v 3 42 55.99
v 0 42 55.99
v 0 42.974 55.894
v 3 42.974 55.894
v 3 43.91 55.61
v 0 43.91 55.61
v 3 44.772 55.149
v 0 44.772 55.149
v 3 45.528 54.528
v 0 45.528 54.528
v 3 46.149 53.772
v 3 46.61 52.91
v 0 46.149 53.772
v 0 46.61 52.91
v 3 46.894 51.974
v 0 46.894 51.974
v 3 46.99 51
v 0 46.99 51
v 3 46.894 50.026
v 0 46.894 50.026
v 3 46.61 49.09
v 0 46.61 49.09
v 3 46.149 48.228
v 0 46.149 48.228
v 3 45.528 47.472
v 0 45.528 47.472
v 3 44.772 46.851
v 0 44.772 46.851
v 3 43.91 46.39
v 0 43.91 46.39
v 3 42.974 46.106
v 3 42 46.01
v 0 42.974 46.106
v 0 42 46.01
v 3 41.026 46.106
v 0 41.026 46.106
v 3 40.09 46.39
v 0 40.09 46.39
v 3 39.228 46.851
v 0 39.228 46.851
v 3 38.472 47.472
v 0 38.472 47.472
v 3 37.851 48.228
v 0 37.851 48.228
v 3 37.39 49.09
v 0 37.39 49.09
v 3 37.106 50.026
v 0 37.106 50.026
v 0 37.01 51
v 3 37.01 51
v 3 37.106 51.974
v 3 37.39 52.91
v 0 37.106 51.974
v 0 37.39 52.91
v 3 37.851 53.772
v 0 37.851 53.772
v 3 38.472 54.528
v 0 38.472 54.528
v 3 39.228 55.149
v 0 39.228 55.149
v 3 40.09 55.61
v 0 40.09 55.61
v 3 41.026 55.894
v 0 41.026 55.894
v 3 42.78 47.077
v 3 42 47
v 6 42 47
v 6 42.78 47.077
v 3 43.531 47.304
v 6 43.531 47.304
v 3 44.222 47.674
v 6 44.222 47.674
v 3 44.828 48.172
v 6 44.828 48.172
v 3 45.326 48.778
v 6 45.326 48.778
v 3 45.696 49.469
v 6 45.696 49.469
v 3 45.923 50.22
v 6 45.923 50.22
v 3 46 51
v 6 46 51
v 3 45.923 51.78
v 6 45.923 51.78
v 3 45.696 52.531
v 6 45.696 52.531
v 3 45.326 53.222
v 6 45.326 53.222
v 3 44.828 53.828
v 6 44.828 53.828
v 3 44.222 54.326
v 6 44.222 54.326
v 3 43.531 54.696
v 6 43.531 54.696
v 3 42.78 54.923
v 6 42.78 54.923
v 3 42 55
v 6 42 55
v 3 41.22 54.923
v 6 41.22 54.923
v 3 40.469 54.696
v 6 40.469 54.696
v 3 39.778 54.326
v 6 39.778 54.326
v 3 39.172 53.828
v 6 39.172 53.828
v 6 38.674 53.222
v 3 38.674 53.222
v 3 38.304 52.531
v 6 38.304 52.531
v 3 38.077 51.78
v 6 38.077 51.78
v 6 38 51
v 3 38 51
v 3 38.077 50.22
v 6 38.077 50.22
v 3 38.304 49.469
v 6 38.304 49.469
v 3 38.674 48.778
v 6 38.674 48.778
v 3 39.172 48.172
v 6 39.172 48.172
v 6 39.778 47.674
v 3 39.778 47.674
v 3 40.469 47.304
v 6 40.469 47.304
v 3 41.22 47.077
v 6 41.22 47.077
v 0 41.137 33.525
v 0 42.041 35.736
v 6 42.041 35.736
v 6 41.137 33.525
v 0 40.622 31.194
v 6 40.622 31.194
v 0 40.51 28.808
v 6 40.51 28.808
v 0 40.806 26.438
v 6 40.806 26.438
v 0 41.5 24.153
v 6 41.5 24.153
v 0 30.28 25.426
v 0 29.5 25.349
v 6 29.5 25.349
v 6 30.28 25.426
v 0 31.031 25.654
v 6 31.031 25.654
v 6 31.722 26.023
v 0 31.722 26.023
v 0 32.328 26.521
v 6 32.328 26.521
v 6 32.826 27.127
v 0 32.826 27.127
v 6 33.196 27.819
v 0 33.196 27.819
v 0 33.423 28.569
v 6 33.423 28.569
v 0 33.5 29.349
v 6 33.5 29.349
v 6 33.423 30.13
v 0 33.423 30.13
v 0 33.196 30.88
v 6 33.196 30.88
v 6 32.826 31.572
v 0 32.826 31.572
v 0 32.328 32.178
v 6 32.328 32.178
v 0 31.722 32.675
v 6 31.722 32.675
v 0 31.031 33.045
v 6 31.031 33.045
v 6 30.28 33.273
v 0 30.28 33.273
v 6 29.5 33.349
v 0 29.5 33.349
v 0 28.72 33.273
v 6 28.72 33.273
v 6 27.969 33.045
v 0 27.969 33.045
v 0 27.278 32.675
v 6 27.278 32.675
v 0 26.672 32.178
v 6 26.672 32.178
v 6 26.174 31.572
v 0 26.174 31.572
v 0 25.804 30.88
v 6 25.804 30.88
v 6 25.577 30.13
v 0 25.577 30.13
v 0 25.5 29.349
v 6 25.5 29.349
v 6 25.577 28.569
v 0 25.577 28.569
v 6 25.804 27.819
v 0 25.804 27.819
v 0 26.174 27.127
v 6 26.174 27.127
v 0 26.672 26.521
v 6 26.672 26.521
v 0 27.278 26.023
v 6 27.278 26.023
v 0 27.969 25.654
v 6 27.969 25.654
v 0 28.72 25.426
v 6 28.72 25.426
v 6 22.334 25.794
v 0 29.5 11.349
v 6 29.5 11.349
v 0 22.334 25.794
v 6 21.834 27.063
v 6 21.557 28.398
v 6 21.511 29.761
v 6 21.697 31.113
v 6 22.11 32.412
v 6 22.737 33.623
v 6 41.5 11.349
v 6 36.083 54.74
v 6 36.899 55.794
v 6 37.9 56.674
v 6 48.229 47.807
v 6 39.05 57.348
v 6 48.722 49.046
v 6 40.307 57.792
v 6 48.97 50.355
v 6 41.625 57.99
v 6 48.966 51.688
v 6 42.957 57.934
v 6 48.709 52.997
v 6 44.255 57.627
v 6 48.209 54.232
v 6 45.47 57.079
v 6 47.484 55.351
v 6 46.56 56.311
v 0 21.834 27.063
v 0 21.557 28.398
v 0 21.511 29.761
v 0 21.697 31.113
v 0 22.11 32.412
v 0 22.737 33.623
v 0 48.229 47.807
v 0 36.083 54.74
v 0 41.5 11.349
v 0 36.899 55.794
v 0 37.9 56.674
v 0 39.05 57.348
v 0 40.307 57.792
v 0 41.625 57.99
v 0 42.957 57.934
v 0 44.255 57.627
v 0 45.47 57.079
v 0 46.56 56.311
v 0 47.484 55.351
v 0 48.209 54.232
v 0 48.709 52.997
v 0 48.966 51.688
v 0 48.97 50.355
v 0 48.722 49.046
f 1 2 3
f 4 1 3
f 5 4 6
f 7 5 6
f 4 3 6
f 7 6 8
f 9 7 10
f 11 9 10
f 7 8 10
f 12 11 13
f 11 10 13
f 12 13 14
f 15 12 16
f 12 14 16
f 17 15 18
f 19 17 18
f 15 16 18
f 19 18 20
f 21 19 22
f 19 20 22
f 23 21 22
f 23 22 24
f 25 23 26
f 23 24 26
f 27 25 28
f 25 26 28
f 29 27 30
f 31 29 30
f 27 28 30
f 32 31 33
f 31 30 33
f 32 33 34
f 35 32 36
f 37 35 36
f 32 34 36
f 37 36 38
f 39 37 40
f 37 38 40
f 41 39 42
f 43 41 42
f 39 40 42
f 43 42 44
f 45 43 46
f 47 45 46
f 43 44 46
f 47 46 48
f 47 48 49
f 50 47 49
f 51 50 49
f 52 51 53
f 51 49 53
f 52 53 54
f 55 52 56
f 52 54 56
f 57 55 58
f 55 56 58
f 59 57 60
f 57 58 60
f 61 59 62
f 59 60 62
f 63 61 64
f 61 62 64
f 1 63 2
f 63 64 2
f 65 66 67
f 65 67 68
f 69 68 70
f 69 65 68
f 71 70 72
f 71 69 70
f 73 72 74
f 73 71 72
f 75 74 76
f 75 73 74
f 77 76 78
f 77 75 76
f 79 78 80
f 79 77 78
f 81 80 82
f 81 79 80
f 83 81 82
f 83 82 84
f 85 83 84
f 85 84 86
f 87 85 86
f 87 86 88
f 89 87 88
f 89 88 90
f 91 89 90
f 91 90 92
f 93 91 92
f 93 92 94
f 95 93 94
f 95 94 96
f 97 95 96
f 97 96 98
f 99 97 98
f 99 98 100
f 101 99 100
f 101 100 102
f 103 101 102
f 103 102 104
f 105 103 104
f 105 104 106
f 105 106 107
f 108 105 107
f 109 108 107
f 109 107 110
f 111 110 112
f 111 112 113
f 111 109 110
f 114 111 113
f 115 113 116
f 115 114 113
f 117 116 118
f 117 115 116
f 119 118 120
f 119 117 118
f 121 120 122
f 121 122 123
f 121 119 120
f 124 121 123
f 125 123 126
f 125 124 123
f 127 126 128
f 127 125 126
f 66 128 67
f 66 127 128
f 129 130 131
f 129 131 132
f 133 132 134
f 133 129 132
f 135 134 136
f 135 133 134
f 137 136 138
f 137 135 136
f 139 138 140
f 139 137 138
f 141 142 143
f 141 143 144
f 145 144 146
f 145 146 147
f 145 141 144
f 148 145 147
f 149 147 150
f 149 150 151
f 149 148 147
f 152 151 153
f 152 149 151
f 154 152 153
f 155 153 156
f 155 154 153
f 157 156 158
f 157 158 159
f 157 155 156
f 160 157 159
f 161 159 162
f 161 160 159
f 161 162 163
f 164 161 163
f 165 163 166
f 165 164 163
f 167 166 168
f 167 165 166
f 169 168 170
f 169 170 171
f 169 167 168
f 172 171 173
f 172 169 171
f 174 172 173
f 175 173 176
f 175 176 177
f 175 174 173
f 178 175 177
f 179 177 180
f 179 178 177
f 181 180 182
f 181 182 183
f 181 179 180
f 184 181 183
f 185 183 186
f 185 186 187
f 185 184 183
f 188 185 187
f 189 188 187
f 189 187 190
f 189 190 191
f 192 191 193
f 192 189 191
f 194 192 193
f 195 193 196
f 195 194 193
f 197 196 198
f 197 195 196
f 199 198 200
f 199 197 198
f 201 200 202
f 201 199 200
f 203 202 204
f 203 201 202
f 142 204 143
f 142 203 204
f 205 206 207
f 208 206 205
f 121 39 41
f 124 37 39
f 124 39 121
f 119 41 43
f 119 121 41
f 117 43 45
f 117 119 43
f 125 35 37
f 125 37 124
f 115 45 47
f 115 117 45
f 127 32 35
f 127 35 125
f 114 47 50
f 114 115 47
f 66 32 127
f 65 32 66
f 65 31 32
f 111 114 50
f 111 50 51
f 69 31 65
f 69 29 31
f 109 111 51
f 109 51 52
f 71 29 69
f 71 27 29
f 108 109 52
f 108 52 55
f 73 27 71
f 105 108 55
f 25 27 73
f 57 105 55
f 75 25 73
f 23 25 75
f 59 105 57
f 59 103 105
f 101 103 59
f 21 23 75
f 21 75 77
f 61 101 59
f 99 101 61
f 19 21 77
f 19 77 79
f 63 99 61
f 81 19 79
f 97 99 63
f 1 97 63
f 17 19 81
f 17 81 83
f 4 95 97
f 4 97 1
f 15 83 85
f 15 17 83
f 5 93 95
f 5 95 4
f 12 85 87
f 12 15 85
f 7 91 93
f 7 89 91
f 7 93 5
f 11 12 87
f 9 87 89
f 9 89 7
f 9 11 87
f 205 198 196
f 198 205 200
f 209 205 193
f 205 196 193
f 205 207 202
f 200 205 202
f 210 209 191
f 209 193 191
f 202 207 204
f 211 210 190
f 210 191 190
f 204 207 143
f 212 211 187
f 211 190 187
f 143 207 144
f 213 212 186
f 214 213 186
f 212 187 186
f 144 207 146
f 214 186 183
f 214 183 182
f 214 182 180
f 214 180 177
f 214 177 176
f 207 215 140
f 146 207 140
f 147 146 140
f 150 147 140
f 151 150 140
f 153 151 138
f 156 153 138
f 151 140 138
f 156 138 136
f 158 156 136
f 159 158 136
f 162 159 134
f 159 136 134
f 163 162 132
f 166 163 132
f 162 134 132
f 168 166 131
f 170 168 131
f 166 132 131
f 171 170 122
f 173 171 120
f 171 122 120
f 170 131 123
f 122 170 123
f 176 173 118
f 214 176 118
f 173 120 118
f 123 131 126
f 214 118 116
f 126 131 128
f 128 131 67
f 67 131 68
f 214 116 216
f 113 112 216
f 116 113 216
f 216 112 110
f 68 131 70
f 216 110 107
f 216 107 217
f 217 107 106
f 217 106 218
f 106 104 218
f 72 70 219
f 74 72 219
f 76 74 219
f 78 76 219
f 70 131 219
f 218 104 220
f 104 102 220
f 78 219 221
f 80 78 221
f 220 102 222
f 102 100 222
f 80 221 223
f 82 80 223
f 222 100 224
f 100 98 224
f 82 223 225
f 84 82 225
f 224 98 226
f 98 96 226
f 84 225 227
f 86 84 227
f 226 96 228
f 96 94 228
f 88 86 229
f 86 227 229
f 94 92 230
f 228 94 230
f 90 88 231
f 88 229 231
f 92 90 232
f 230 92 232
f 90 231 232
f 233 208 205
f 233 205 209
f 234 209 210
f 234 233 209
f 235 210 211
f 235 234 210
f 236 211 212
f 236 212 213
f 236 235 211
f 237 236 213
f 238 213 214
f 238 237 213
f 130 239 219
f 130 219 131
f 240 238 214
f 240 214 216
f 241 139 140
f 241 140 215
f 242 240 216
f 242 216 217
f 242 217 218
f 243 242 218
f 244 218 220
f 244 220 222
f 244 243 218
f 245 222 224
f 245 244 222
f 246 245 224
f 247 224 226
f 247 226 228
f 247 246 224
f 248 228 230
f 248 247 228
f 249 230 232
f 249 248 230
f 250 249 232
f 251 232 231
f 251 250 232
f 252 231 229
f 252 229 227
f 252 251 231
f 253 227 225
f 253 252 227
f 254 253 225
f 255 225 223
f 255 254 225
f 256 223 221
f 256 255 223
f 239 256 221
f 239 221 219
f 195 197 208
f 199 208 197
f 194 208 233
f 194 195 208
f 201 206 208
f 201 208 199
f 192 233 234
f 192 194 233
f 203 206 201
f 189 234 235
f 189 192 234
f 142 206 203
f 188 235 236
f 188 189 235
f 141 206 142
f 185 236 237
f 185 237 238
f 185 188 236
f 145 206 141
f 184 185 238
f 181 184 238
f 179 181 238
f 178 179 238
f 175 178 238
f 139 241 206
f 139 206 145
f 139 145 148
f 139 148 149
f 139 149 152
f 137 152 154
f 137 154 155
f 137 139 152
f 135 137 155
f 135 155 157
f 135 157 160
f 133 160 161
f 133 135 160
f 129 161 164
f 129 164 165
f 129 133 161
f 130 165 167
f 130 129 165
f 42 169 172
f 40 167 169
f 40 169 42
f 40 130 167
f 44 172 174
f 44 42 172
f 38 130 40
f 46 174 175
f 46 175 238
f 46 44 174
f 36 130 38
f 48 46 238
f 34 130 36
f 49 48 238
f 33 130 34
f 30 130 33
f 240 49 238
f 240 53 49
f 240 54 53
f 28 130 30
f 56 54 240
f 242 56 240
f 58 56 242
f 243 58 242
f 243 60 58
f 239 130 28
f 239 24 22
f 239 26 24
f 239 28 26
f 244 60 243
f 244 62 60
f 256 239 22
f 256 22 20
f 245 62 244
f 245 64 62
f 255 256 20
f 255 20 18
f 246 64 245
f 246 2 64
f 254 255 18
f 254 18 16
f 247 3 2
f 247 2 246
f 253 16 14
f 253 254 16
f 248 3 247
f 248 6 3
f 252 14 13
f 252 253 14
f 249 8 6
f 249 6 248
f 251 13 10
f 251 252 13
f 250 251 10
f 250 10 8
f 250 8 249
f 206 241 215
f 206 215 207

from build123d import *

# Parameters (mm, degrees)
SKETCH2_R           = 4
BOSS_EXTRUDE1_DEPTH = 6
SKETCH3_R           = 4.99
CUT_EXTRUDE1_DEPTH  = 3


with BuildPart() as part:
    # Sketch2 → Boss-Extrude1 (new body)
    with BuildSketch(Plane(origin=(0, 0, 0), x_dir=(0, 0, -1), z_dir=(1, 0, 0))):
        with BuildLine():
            Line((-47.806823021, 48.229255235), (-35.735718863, 42.04148953))
            ThreePointArc((-35.735718863, 42.04148953), (-30.003159714, 40.51527432), (-24.153212483, 41.5))
            Line((-24.153212483, 41.5), (-11.349364905, 41.5))
            Line((-11.349364905, 41.5), (-11.349364905, 29.5))
            Line((-11.349364905, 29.5), (-25.79380935, 22.333548668))
            ThreePointArc((-25.79380935, 22.333548668), (-29.761404347, 21.510618078), (-33.623291754, 22.737341551))
            Line((-33.623291754, 22.737341551), (-54.739685992, 36.082673857))
            ThreePointArc((-54.739685992, 36.082673857), (-57.079434827, 45.469938354), (-47.806823021, 48.229255235))
        make_face()
        with Locations((-51, 42)):
            Circle(SKETCH2_R, mode=Mode.SUBTRACT)
        with Locations((-29.349364905, 29.5)):
            Circle(SKETCH2_R, mode=Mode.SUBTRACT)
    extrude(amount=BOSS_EXTRUDE1_DEPTH)

    # Sketch3 → Cut-Extrude1 (cut)
    with BuildSketch(Plane.ZY):
        with Locations((51, 42)):
            Circle(SKETCH3_R)
    extrude(amount=-CUT_EXTRUDE1_DEPTH, mode=Mode.SUBTRACT)


solid = part.part
